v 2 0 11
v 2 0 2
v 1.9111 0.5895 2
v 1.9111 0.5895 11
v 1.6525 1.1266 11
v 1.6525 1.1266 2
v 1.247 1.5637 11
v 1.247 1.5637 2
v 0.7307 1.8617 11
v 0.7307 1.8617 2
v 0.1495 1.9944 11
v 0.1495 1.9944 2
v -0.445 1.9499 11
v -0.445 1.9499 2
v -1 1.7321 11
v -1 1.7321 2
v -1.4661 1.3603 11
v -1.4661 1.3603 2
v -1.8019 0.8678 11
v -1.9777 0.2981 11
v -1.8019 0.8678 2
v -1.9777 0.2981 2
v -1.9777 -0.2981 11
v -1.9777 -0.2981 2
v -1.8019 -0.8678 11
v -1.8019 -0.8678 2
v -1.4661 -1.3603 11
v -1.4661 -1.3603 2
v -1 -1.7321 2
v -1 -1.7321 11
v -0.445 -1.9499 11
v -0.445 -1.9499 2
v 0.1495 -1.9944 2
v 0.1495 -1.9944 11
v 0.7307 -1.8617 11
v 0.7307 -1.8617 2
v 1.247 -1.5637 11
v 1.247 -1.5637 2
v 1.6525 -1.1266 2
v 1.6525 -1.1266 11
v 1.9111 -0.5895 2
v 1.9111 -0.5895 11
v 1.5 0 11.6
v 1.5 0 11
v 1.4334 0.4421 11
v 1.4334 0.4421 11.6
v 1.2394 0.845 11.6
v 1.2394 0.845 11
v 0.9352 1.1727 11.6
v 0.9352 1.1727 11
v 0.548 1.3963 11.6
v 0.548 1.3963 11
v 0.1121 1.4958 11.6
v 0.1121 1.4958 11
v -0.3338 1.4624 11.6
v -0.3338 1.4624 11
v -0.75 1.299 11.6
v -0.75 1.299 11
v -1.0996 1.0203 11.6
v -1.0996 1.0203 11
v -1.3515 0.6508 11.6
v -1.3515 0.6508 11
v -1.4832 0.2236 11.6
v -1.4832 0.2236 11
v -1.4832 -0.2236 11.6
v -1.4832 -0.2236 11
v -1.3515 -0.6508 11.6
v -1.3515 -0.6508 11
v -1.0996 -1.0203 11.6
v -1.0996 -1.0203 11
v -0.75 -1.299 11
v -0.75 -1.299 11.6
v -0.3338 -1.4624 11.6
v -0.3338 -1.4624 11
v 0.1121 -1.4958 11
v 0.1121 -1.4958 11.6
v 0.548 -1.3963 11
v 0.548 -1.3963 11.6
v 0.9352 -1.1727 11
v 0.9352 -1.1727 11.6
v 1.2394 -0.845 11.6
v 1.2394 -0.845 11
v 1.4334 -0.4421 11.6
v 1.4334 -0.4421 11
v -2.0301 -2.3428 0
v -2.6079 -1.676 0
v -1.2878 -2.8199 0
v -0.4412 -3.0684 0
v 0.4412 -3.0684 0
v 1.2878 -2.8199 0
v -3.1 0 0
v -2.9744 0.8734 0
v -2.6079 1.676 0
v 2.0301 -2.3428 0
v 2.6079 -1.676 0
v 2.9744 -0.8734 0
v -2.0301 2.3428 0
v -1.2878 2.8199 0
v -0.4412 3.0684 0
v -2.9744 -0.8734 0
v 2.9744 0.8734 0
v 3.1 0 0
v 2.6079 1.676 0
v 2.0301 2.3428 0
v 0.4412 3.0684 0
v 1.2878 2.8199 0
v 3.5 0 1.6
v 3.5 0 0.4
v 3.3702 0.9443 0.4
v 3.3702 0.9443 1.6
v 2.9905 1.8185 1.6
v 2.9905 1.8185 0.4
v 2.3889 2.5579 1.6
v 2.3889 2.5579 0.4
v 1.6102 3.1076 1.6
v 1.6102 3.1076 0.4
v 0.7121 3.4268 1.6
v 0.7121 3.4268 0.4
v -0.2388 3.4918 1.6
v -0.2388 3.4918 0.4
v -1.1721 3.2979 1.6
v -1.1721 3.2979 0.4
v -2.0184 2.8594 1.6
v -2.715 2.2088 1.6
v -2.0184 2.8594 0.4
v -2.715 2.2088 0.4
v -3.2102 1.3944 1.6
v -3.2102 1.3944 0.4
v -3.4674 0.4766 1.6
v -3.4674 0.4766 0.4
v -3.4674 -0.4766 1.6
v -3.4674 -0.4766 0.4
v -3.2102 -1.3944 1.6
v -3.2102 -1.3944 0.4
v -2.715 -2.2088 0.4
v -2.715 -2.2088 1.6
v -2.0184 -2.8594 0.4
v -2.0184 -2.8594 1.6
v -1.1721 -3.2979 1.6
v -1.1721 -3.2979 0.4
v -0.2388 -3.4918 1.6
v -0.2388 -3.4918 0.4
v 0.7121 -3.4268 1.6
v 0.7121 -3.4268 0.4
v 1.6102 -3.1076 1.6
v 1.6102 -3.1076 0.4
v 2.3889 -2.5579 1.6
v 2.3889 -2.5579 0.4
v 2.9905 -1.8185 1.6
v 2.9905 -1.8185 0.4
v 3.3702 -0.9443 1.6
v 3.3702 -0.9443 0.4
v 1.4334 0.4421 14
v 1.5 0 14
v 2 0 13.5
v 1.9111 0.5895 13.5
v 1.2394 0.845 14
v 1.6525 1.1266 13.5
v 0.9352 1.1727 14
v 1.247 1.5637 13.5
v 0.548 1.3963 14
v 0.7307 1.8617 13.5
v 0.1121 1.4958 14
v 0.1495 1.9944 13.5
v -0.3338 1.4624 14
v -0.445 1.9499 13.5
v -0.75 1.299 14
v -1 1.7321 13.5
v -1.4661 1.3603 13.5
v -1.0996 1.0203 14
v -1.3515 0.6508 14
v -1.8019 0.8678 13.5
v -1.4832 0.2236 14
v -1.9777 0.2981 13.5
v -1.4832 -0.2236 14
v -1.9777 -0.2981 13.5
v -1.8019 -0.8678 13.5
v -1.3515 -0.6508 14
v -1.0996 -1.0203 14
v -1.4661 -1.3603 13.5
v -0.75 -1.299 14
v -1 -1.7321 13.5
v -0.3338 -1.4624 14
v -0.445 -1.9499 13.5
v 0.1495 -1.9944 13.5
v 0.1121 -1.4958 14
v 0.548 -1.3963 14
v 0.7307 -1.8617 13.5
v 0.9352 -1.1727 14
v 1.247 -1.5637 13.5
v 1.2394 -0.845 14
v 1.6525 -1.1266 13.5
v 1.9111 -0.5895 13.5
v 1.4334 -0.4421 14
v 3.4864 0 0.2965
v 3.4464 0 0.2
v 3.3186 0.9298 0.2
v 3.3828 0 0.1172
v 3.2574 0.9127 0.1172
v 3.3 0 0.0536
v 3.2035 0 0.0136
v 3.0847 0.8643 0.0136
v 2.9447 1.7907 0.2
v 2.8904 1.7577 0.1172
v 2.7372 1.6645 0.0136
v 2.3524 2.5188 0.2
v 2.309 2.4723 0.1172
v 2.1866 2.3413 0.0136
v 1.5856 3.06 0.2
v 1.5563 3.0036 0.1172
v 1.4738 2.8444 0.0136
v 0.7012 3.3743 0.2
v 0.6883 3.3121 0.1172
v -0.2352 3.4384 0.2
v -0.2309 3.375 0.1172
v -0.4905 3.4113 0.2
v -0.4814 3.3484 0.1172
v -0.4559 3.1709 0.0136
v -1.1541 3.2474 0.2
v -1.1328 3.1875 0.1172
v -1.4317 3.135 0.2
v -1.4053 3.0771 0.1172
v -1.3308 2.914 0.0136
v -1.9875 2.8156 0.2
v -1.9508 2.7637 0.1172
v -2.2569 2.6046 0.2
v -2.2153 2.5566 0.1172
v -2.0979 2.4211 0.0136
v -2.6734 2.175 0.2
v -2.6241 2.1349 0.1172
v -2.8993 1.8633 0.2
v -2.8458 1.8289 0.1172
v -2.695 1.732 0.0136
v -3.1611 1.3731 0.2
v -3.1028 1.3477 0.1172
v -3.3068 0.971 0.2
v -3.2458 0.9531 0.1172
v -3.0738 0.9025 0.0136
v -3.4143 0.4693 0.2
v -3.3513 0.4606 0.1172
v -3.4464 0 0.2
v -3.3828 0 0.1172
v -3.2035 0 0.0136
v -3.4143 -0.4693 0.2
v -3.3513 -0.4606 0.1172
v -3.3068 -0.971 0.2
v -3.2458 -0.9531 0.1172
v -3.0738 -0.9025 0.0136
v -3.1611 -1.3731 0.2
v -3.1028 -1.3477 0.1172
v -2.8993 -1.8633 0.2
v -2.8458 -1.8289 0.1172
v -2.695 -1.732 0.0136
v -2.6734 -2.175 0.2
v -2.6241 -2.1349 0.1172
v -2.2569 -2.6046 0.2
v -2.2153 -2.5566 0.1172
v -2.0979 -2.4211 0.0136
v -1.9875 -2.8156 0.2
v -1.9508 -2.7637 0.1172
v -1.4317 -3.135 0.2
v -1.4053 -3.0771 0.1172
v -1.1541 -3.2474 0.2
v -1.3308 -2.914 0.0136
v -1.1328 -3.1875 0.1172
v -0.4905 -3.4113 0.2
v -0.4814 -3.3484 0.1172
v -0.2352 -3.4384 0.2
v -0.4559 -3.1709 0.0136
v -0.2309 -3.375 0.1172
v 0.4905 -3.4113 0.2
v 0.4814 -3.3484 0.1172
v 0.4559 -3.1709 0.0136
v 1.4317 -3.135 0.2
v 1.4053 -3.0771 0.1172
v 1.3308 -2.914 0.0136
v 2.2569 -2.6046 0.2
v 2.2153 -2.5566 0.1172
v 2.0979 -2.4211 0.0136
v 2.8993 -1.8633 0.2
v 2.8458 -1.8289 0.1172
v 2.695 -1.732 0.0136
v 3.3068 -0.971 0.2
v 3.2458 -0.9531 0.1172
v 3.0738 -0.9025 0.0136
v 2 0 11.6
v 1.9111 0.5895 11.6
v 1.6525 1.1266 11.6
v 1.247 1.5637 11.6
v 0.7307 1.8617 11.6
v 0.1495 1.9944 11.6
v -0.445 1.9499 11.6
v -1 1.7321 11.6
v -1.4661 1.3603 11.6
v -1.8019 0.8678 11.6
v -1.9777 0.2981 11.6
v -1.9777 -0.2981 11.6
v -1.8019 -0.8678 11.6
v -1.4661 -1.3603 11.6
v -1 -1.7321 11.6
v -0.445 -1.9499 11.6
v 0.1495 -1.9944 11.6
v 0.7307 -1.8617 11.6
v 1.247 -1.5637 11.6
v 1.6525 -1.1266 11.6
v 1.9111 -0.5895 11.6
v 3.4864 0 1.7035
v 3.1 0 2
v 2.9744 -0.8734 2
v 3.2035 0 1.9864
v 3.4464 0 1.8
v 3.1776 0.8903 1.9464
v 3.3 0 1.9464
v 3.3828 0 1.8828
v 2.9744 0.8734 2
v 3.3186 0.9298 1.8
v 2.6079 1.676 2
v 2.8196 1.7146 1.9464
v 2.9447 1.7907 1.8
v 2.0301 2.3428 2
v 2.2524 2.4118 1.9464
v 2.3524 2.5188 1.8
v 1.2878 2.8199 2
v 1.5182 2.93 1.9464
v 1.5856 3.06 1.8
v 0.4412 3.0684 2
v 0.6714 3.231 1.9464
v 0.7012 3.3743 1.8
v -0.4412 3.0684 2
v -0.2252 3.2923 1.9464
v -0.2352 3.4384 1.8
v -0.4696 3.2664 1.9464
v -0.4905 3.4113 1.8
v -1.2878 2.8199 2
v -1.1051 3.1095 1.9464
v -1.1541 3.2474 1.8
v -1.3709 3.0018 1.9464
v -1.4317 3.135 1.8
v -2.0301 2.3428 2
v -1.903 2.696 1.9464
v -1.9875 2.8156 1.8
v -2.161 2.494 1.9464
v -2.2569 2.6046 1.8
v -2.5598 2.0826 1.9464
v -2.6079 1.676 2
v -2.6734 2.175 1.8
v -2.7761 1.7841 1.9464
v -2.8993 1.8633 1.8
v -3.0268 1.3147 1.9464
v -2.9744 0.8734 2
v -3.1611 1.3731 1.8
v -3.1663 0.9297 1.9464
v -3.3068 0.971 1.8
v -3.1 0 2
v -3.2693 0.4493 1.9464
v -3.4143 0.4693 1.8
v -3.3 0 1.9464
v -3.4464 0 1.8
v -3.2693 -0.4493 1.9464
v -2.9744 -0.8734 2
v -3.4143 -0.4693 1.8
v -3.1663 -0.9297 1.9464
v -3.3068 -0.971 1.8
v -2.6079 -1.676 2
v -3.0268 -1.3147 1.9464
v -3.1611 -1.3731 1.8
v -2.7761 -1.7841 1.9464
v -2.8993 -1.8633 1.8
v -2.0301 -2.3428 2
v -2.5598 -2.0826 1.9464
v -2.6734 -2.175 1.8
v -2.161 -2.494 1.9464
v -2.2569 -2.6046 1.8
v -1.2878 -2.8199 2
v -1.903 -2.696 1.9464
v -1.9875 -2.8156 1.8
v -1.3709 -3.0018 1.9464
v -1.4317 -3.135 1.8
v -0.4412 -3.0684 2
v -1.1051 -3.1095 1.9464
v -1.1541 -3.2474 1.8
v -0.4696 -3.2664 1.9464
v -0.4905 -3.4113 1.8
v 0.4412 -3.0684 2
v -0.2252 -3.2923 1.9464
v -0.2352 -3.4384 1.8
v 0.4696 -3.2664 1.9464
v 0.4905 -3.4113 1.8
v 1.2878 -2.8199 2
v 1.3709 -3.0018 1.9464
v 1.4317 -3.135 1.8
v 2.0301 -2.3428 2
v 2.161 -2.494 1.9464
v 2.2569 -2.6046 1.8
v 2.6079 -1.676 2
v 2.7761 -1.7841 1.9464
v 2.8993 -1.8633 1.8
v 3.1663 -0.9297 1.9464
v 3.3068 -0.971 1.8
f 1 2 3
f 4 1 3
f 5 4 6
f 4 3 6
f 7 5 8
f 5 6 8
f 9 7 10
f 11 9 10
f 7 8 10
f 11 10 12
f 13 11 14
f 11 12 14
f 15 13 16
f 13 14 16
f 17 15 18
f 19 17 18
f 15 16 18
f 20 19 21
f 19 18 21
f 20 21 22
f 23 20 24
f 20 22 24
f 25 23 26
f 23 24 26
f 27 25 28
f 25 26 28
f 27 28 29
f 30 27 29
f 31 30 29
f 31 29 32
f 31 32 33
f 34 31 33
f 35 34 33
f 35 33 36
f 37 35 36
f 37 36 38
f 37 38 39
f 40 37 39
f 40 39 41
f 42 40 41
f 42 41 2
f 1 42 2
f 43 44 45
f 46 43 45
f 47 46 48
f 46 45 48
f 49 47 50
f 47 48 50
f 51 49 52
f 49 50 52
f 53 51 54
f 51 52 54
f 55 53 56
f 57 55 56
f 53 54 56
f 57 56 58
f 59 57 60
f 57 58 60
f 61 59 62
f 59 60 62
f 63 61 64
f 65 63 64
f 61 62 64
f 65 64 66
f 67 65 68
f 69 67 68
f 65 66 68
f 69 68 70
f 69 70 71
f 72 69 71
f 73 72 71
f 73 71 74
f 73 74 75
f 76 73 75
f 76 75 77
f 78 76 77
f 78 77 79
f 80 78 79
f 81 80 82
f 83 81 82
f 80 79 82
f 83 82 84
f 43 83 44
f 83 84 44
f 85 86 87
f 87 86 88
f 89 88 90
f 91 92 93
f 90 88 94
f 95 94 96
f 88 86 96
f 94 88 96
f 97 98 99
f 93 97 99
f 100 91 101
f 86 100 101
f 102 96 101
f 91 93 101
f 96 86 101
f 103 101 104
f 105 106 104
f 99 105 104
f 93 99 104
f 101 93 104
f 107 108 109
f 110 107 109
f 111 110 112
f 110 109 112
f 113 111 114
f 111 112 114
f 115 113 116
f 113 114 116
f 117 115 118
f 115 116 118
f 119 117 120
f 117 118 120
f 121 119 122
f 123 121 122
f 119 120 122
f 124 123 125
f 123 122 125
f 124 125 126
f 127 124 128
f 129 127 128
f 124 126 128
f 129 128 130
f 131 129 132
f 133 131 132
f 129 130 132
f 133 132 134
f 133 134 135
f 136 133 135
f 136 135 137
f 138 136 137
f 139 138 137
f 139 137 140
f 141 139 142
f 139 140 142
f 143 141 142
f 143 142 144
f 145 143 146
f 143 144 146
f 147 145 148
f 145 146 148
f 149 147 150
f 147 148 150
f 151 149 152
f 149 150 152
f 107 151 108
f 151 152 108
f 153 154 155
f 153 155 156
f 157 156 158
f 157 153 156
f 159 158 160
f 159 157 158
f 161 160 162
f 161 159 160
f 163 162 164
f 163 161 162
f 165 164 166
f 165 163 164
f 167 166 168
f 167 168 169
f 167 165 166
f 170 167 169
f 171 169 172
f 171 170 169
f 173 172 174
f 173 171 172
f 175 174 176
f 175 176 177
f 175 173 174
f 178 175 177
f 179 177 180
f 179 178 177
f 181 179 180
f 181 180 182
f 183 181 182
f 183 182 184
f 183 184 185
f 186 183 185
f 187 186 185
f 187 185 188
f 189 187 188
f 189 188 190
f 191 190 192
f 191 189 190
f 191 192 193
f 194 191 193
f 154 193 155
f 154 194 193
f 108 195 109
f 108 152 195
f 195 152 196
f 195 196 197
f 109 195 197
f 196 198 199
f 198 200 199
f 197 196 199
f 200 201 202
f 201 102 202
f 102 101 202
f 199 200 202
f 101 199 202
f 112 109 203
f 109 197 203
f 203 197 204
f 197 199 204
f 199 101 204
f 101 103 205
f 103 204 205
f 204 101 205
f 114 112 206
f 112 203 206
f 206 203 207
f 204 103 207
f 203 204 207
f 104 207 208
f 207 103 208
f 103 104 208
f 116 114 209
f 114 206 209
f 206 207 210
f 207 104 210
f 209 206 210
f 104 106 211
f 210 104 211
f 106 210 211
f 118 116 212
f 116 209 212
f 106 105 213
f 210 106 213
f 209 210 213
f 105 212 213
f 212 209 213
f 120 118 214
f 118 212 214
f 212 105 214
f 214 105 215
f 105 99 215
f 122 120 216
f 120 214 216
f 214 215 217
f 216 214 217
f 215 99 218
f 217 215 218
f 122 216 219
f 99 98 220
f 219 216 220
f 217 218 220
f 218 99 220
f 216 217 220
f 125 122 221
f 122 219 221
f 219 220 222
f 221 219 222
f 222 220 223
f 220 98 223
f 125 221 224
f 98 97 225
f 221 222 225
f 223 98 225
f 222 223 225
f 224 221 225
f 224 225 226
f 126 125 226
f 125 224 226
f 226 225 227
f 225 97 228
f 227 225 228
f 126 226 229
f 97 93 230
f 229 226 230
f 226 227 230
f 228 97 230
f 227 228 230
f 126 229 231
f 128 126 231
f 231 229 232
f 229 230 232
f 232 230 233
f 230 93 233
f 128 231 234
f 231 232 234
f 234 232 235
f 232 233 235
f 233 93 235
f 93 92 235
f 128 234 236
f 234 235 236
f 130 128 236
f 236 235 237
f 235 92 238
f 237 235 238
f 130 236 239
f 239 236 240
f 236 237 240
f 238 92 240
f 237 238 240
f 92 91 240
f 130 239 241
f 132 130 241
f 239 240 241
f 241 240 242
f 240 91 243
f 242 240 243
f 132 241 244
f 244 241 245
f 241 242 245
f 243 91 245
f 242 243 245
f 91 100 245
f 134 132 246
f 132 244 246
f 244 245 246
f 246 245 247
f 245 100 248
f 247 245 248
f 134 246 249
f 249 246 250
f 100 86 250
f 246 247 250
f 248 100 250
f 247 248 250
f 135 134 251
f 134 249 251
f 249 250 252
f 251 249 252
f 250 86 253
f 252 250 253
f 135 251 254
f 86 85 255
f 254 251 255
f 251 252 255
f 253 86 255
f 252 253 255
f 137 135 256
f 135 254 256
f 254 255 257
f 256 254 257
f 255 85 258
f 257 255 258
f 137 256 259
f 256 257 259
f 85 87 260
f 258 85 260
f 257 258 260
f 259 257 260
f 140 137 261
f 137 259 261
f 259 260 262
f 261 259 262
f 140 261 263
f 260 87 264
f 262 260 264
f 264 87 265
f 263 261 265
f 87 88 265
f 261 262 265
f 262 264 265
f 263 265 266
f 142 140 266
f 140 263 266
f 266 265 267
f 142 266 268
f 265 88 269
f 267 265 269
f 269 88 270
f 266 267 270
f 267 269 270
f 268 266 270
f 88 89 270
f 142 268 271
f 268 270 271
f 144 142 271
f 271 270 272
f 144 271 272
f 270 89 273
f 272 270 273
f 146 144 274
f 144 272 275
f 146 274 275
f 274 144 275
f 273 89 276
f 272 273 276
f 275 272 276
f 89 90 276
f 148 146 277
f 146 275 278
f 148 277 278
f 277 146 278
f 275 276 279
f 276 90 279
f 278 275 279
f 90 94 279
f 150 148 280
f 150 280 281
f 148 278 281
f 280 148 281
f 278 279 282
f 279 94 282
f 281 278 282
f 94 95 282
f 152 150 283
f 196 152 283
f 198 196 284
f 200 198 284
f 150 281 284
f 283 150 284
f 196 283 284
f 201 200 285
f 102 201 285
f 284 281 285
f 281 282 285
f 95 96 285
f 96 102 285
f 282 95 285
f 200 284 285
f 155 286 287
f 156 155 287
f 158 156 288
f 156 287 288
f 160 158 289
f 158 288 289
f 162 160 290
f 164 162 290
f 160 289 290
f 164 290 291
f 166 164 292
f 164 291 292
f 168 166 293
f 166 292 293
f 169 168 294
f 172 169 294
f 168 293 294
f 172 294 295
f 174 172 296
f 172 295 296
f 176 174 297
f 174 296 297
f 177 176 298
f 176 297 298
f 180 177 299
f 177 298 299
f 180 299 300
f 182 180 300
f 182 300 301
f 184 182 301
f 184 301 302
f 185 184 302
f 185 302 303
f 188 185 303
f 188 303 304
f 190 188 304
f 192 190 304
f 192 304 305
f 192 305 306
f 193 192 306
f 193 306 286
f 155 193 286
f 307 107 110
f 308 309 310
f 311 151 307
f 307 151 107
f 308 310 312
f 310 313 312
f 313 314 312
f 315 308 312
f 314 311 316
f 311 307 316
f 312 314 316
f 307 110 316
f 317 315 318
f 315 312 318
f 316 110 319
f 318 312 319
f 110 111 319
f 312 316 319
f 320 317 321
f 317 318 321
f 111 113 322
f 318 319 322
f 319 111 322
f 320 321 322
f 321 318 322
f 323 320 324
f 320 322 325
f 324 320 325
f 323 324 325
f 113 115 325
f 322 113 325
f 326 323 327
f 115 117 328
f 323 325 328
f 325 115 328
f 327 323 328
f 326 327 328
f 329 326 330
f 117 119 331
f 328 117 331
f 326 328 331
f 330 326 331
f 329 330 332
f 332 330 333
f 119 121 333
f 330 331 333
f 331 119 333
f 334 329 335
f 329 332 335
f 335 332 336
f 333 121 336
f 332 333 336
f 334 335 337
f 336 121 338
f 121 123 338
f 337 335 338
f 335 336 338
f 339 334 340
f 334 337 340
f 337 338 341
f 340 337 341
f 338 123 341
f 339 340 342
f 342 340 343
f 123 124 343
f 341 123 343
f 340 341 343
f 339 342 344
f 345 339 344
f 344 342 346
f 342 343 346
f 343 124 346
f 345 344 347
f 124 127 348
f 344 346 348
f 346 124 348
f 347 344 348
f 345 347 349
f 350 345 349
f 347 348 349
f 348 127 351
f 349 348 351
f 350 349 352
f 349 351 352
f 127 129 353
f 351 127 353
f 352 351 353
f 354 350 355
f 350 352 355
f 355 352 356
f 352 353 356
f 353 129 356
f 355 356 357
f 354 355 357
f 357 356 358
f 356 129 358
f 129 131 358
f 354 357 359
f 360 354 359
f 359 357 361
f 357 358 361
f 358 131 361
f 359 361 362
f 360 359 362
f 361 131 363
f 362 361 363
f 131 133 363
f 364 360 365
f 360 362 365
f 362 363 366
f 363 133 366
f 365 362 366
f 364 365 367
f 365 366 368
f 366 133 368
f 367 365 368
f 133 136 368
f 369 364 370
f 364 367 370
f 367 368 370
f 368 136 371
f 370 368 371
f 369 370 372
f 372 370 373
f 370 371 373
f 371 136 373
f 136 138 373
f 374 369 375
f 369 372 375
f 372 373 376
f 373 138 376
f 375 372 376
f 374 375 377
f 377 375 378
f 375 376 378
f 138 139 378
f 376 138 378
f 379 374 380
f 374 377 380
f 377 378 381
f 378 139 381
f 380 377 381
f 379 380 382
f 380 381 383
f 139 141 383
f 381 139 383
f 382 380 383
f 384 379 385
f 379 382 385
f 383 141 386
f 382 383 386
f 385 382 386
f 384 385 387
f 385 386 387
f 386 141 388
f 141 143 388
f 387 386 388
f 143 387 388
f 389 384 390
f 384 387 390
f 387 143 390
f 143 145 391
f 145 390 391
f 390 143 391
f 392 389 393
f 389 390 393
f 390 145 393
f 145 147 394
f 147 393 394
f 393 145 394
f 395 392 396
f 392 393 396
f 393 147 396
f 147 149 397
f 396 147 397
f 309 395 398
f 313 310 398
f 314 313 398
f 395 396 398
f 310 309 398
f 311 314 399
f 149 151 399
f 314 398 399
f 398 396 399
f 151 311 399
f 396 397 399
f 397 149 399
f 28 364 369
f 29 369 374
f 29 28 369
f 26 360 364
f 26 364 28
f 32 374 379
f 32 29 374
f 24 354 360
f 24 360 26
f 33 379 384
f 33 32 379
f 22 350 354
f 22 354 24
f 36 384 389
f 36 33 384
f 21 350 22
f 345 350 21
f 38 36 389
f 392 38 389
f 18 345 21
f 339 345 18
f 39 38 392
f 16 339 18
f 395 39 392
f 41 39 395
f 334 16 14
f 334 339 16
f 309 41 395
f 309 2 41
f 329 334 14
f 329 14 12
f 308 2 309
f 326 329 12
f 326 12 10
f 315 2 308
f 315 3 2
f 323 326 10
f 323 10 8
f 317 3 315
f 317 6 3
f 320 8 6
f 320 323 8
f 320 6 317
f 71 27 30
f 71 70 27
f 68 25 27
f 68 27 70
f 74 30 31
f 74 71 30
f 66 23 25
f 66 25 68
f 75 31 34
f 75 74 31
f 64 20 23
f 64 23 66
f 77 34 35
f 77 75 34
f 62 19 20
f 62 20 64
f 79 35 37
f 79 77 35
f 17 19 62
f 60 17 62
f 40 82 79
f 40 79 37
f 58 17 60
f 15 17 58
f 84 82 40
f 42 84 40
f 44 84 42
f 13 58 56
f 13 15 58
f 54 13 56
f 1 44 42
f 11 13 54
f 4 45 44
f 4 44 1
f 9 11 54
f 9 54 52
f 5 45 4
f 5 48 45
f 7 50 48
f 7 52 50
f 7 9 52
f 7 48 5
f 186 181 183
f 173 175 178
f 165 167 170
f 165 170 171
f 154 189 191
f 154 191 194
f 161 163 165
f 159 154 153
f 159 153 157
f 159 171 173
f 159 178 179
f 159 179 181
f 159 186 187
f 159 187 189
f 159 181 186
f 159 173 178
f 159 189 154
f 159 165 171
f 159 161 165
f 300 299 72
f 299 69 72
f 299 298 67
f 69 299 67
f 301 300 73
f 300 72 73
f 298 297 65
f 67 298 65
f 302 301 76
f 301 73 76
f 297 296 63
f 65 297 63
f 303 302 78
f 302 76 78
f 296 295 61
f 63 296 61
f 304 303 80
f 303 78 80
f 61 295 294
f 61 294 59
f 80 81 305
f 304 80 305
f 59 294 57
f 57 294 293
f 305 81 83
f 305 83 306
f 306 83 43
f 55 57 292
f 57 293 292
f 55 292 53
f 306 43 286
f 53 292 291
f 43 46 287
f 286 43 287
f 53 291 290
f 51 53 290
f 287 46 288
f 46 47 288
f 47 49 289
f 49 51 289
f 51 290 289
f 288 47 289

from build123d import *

# Parameters (mm, degrees)
SKETCH_1_R          = 3.5
EXTRUDE_1_DEPTH     = 2
SKETCH_2_R          = 2
EXTRUDE_2_DEPTH     = 12
CUT_EXTRUDE_START   = -3
SKETCH_3_R          = 2
SKETCH_3_R_2        = 1.5
CUT_EXTRUDE_1_DEPTH = 0.6
CHAMFER_1_SIZE      = 0.5
FILLET_1_R          = 0.4


with BuildPart() as part:
    # 草图1 → 凸台-拉伸1 (new body)
    with BuildSketch(Plane.XY):
        Circle(SKETCH_1_R)
    extrude(amount=EXTRUDE_1_DEPTH)

    # 草图2 → 凸台-拉伸2 (add)
    with BuildSketch(Plane.XY.offset(2)):
        Circle(SKETCH_2_R)
    extrude(amount=EXTRUDE_2_DEPTH)

    # 草图3 → 切除-拉伸1 (cut)
    with BuildSketch(Plane.XY.offset(14).offset(CUT_EXTRUDE_START)):
        Circle(SKETCH_3_R)
        Circle(SKETCH_3_R_2, mode=Mode.SUBTRACT)
    extrude(amount=CUT_EXTRUDE_1_DEPTH, mode=Mode.SUBTRACT)

    # 倒角1
    chamfer_1_edges = [part.edges().sort_by_distance(p)[0] for p in [
        (-2, 0, 14),
    ]]
    chamfer(chamfer_1_edges, length=CHAMFER_1_SIZE)

    # 圆角1
    fillet_1_edges = [part.edges().sort_by_distance(p)[0] for p in [
        (-3.5, 0, 0),
        (-3.5, 0, 2),
    ]]
    fillet(fillet_1_edges, radius=FILLET_1_R)


solid = part.part
